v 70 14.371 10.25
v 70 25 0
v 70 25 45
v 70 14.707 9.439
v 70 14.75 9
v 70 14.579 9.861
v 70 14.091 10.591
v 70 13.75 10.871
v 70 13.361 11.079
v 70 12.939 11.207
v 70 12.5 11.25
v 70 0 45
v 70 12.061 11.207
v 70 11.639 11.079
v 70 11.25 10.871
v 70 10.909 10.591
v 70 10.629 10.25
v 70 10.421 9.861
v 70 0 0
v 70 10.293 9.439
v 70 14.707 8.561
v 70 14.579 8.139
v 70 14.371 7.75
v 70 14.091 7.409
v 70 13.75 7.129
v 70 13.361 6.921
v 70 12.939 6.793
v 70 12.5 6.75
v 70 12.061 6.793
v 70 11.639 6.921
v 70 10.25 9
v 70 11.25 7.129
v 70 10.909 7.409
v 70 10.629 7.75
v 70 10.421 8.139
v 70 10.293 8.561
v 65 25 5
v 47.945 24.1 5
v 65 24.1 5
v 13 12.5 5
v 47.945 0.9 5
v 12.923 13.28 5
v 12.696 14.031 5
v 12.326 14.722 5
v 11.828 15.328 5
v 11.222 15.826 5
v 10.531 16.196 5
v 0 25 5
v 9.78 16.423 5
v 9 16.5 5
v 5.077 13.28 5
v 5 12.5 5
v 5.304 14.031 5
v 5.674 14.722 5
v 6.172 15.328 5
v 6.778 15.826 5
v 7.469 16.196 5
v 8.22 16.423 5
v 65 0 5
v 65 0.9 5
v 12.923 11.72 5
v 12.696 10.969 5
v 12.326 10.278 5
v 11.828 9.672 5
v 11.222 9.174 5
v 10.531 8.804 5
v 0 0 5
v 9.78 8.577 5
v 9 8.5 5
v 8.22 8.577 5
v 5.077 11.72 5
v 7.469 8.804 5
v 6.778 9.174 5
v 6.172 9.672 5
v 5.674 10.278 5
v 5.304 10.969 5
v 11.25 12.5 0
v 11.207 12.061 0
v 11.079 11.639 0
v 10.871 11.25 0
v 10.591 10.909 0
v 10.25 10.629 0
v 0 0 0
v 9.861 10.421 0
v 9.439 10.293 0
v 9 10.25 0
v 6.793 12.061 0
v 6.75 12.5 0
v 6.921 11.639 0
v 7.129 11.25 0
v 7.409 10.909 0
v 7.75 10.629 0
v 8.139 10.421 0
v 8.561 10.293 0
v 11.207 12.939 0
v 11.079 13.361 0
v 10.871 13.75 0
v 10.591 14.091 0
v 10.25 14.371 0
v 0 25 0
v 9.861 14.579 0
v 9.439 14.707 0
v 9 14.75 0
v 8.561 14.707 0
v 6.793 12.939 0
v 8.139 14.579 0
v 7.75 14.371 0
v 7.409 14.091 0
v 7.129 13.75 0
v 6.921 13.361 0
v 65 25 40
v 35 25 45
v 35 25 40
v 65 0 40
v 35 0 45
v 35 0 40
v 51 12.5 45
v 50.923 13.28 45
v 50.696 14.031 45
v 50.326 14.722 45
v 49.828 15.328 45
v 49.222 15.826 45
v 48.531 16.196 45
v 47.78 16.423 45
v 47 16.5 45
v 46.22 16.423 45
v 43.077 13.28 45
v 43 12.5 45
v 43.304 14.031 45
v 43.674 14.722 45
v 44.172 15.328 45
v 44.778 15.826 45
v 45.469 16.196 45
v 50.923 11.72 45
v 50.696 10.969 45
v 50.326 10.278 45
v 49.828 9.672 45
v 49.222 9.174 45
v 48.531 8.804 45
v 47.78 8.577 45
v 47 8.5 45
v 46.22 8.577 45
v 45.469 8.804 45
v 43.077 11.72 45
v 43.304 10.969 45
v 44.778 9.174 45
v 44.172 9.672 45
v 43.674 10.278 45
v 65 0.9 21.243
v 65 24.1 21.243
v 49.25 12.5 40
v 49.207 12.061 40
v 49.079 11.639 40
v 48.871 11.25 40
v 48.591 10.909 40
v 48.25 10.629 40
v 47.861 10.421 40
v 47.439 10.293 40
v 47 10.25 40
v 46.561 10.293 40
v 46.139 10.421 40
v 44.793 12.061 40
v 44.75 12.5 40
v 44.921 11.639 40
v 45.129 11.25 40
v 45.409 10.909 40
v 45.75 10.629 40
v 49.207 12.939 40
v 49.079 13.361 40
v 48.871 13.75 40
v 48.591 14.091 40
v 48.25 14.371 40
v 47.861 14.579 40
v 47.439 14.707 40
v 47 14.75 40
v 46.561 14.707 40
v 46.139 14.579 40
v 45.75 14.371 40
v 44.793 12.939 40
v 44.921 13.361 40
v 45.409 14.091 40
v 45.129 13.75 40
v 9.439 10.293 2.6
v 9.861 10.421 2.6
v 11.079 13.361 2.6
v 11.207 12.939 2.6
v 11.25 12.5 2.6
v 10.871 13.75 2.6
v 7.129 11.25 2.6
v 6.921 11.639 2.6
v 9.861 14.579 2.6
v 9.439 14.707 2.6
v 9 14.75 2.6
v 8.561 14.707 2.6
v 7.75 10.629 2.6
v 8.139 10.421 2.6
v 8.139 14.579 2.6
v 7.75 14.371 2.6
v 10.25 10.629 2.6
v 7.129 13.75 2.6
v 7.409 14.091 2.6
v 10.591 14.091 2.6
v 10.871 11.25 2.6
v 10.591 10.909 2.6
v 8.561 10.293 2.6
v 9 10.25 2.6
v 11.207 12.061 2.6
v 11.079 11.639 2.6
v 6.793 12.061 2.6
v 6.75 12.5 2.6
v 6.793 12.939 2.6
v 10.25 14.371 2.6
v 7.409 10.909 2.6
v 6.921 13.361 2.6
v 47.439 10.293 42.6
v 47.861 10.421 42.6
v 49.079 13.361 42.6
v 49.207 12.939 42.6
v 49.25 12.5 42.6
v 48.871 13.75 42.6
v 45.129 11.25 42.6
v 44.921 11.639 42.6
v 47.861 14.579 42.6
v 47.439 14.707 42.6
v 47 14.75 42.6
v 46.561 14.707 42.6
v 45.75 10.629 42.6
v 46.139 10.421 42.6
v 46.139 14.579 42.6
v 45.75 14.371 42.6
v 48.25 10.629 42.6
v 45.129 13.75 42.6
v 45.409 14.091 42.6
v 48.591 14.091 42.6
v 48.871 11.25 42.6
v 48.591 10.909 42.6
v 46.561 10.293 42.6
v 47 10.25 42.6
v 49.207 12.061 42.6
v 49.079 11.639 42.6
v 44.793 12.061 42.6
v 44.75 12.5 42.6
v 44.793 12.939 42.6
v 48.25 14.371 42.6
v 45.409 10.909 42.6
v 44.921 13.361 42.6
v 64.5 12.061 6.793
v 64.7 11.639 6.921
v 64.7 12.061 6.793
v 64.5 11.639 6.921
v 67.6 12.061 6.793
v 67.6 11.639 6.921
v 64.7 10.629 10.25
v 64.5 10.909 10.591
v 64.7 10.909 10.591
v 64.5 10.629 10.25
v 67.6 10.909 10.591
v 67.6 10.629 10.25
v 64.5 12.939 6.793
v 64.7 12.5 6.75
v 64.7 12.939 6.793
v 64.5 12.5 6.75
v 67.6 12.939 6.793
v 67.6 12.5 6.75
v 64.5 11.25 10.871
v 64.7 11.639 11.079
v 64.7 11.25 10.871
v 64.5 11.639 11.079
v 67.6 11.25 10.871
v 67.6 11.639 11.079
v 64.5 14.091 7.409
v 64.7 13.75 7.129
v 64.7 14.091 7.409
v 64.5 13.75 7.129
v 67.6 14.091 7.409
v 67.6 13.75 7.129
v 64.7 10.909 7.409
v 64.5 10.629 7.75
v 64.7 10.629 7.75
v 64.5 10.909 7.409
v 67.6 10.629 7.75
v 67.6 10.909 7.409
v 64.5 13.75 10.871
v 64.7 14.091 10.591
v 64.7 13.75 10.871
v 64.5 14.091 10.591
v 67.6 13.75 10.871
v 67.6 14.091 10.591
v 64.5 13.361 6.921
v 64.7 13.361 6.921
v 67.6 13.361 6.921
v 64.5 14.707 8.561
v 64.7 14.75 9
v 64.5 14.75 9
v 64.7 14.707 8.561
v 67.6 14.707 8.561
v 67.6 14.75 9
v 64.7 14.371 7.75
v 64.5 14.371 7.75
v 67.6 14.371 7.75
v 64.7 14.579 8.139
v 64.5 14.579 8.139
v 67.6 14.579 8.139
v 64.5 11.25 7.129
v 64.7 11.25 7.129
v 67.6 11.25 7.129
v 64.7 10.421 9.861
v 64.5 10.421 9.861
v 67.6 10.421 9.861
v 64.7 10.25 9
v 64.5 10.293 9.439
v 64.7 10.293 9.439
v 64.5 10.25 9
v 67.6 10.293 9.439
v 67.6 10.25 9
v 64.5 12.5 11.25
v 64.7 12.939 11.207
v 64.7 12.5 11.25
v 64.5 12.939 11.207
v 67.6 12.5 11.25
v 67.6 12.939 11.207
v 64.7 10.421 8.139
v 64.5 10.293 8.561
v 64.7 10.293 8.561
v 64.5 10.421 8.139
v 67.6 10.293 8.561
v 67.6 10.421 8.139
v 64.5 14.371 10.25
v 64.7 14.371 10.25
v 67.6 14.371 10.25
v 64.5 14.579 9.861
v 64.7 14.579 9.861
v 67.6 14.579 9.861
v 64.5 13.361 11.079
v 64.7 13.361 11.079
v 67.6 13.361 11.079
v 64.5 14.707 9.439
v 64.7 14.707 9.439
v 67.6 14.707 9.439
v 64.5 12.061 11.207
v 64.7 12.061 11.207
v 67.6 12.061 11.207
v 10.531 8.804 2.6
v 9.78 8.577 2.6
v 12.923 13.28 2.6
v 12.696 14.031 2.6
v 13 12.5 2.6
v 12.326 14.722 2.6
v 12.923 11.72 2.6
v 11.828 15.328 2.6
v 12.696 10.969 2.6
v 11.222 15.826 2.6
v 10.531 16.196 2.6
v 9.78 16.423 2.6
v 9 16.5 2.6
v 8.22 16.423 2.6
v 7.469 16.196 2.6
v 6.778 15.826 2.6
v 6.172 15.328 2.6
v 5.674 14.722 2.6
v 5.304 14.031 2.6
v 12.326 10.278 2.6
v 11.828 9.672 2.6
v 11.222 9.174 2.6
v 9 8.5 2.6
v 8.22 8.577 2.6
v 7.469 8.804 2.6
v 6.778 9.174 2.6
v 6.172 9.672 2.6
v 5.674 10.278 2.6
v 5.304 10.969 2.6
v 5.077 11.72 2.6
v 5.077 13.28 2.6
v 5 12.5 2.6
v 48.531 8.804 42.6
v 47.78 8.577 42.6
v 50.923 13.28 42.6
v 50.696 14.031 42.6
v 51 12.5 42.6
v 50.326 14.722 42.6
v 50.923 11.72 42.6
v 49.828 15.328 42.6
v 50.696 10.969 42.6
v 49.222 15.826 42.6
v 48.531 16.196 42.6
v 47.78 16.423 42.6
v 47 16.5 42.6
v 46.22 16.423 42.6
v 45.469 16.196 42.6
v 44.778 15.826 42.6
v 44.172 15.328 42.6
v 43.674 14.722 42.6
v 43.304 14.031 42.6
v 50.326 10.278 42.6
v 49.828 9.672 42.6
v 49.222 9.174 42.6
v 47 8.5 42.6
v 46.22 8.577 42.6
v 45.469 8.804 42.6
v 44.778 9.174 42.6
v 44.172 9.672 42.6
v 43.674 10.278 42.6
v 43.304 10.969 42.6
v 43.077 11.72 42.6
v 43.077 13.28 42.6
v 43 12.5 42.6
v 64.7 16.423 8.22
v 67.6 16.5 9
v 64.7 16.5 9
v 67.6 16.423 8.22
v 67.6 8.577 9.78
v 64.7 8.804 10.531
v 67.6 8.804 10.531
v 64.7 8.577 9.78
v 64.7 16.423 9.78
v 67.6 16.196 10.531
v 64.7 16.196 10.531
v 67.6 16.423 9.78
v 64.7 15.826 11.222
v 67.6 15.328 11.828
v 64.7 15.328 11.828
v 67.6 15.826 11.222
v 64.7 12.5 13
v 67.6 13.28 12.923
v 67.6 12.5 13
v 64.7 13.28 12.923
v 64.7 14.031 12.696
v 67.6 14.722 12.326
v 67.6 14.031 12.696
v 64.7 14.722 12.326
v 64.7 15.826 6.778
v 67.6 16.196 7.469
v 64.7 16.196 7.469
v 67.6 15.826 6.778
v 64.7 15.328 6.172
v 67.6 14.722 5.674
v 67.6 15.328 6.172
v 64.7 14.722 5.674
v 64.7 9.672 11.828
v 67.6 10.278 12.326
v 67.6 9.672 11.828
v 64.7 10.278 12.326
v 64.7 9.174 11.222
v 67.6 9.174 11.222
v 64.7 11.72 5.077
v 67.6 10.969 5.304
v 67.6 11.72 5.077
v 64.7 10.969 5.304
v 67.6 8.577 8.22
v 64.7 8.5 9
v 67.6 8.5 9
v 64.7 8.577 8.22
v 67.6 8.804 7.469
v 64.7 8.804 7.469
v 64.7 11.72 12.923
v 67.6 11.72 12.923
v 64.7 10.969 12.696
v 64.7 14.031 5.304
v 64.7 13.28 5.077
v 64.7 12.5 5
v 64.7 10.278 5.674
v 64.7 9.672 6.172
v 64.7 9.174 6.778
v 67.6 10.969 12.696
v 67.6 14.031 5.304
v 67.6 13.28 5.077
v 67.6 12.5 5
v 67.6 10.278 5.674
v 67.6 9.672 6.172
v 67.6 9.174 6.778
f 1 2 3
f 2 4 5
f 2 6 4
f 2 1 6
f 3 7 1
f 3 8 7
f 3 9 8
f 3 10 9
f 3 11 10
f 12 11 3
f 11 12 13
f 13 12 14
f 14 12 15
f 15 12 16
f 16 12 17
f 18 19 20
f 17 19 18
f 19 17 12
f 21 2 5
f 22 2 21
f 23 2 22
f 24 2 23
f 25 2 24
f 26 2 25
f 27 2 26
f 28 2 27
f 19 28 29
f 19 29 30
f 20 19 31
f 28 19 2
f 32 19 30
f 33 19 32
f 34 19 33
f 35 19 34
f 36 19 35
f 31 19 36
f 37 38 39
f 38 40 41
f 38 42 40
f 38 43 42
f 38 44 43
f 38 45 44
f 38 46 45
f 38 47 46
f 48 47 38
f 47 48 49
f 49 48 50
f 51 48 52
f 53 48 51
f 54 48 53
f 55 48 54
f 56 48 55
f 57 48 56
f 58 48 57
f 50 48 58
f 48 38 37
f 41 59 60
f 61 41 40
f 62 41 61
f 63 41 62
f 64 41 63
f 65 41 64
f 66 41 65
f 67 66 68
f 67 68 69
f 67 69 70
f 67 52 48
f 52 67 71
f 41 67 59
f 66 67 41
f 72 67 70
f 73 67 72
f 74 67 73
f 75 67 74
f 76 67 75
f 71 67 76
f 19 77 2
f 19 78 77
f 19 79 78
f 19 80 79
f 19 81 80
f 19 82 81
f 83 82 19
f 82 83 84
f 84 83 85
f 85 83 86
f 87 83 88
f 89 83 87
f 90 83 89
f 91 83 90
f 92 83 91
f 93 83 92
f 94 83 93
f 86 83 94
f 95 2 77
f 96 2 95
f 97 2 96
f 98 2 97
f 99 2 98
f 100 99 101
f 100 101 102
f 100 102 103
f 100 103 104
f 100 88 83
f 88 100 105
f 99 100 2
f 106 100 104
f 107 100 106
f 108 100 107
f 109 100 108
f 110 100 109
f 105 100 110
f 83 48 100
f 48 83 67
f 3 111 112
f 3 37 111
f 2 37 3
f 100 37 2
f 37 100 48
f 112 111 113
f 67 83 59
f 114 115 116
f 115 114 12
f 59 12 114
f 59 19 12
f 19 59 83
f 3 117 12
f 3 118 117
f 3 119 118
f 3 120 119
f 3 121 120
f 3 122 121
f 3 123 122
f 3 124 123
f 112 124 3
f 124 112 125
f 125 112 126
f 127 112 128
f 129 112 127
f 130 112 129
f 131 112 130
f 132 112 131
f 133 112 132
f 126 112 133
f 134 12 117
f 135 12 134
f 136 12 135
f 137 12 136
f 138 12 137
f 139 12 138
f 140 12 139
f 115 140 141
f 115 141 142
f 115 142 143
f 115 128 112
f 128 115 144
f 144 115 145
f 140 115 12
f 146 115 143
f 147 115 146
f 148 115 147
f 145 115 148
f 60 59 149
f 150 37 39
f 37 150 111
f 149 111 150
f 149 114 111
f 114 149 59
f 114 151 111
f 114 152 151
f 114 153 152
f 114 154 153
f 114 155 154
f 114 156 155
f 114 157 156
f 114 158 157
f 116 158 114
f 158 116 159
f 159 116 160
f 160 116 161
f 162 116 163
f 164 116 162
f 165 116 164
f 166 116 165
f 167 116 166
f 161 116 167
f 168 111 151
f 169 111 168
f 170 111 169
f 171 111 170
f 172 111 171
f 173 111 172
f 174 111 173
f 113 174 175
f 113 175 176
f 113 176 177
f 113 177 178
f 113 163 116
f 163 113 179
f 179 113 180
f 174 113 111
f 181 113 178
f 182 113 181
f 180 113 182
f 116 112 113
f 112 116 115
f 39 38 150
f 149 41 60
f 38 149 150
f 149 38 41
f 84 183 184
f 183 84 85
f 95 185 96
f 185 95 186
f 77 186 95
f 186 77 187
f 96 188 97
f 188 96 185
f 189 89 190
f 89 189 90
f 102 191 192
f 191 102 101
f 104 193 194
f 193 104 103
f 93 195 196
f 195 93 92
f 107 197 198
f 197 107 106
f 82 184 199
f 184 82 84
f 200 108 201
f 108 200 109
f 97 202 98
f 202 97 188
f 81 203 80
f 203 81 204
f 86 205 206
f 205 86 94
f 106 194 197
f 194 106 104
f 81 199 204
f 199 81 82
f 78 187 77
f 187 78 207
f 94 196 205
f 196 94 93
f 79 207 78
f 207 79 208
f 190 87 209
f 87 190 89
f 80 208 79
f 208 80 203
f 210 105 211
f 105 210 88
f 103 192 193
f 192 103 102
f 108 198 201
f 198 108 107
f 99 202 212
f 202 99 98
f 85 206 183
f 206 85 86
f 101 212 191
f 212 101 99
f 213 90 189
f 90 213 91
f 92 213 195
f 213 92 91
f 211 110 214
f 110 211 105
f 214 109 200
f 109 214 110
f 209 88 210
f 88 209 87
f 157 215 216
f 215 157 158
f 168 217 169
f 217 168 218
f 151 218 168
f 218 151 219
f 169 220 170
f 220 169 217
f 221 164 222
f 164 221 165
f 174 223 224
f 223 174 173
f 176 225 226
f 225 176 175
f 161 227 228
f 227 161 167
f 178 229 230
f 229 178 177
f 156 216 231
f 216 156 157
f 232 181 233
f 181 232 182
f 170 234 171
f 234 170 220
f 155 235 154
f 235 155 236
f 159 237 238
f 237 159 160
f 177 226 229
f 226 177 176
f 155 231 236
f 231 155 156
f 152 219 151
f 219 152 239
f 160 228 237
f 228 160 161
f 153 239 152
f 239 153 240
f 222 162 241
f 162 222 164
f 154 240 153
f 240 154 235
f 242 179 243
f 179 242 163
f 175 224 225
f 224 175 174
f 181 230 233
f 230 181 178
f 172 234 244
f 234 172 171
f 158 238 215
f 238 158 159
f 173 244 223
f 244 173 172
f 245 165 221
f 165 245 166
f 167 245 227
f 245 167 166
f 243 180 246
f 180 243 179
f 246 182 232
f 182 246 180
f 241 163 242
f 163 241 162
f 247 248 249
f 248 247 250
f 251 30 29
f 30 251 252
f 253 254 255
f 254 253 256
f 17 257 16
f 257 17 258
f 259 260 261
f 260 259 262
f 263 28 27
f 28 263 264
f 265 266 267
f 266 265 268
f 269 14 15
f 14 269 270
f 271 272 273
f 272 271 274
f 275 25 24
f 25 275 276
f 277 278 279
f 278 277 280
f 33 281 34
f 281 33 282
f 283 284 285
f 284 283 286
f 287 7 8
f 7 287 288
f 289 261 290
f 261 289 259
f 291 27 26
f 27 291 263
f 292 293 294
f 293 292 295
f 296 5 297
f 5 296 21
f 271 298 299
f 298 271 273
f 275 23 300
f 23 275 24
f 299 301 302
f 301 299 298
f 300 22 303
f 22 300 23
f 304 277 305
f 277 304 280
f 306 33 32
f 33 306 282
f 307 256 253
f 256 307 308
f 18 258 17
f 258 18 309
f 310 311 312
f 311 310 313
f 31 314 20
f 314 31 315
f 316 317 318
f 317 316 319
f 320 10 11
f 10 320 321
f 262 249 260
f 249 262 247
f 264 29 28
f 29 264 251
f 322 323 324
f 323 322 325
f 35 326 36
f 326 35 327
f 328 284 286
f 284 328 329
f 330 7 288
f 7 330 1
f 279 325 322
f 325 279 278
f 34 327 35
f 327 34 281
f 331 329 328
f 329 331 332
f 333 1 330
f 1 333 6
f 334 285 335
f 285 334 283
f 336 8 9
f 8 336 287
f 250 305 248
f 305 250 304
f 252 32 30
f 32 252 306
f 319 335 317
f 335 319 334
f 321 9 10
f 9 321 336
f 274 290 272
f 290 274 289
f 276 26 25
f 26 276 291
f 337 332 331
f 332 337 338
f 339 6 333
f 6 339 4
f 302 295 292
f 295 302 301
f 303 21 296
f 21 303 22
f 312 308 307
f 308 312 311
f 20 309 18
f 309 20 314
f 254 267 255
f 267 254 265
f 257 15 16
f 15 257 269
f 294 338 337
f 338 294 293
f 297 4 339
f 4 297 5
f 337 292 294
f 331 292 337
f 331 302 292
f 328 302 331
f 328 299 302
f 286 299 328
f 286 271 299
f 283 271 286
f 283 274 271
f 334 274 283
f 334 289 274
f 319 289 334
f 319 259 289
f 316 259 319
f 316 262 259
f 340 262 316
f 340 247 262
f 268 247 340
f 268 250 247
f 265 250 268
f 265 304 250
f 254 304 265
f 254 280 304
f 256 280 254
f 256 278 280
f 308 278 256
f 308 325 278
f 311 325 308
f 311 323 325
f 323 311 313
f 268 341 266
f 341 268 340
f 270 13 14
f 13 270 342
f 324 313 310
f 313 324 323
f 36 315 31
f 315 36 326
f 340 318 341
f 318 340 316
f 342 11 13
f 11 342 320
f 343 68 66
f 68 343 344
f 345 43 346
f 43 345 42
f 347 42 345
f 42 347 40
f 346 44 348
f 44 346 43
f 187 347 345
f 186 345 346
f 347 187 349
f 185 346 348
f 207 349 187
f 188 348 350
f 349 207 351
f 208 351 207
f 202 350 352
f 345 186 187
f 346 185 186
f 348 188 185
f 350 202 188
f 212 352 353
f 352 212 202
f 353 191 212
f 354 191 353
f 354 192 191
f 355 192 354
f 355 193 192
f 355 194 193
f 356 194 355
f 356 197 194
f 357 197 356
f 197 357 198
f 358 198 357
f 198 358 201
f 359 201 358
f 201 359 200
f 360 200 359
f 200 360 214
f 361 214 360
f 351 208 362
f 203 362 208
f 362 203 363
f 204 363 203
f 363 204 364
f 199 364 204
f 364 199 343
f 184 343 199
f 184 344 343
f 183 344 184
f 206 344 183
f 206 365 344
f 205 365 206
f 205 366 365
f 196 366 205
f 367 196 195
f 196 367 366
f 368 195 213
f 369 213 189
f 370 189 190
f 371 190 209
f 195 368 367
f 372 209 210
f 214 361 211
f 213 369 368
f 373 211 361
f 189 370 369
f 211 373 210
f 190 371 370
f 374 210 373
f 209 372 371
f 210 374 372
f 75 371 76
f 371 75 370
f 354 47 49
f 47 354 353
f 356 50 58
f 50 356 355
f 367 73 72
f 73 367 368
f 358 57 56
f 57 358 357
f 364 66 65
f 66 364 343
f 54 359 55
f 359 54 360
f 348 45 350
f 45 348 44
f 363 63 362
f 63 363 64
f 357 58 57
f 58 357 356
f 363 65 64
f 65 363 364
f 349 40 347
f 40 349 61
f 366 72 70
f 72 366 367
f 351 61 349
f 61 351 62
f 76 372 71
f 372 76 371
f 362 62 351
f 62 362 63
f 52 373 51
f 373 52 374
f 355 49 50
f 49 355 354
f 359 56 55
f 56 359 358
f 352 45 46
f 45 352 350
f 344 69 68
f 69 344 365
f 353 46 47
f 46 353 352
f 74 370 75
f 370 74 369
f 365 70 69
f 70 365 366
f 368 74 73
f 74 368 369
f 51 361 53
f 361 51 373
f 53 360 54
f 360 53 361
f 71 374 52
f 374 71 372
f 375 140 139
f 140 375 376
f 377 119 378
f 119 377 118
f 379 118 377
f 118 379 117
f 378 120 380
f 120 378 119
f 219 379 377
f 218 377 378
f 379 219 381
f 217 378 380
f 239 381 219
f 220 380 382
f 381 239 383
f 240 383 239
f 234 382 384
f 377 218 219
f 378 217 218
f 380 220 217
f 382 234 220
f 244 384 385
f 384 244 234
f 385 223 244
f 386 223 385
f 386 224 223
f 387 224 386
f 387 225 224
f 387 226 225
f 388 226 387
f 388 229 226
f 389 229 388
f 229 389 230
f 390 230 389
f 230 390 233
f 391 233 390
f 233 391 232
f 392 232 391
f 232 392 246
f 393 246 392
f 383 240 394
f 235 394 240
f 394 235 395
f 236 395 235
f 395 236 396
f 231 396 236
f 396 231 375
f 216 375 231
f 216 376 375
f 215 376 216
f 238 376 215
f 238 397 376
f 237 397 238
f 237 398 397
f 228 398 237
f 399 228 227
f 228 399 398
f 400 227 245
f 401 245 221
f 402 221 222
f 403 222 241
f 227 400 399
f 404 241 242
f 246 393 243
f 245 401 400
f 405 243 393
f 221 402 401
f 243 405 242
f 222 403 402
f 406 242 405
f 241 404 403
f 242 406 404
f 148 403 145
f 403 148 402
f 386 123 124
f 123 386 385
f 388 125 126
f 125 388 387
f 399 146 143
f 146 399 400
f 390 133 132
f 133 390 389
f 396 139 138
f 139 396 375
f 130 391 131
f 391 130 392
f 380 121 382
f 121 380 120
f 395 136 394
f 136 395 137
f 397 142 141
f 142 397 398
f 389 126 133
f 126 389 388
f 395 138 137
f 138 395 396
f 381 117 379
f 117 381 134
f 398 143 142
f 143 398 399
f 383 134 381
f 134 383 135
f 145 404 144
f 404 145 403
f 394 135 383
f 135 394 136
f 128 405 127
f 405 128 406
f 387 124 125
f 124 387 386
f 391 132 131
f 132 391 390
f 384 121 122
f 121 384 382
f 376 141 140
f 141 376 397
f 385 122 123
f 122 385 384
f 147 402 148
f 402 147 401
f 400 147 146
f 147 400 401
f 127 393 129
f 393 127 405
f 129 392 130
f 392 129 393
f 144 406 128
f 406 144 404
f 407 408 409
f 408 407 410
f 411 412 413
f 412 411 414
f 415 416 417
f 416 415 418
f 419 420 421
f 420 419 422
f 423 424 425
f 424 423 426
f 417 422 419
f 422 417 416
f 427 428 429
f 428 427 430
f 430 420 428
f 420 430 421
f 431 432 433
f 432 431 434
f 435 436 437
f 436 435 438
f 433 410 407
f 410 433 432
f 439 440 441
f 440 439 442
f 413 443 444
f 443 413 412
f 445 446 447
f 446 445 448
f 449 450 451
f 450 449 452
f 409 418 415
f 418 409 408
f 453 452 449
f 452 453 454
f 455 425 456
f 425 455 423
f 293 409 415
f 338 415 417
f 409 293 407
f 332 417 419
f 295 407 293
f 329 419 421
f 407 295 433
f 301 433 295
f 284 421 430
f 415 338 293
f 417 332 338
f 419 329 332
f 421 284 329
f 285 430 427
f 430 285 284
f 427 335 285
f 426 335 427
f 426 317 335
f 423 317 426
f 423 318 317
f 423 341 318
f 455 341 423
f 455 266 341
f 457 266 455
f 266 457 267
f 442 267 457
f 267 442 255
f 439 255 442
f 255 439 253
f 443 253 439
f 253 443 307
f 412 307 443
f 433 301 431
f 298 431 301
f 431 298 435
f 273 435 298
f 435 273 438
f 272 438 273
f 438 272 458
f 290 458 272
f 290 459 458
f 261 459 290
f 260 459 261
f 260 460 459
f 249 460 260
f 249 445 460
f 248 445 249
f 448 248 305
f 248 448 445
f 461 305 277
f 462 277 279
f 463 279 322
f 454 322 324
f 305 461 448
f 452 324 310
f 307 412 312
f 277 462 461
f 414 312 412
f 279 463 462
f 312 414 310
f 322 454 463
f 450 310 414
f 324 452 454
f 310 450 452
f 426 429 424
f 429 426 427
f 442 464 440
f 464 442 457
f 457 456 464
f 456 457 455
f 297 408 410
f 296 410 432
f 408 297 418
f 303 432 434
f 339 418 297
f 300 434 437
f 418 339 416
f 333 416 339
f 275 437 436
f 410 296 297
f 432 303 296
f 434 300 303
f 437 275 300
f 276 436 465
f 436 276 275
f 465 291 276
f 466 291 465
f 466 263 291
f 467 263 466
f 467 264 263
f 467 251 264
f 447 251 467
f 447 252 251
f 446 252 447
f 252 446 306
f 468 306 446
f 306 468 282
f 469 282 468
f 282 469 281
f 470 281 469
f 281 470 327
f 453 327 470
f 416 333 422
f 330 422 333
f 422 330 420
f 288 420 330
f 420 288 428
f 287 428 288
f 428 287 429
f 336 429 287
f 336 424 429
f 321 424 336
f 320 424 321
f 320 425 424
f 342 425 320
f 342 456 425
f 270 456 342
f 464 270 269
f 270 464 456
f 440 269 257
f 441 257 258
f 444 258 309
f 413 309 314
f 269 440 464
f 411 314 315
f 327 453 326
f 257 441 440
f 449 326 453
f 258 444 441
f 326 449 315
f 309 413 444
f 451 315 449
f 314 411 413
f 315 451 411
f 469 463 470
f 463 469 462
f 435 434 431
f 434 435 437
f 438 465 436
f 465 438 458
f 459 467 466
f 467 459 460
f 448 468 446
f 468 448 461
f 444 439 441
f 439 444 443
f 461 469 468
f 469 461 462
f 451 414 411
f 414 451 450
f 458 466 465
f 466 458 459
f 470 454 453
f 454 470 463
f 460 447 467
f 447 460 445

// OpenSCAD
$fn = 32;

// ----------------------------------------------------------------------
// Z-bracket: 70 x 25 x 45 mm
// ----------------------------------------------------------------------

// --- parameters (mm) ---
bottom_run = 70;          // lower foot length, X
top_run = 30;             // upper foot length, X
profile_w = 25;           // bracket width, Y
height = 45;              // overall rise, Z
mat_t = 5;                // plate thickness
hole_d = 4.5;             // clearance for M4
cb_d = 8;                 // counterbore diameter
cb_h = 2.4;               // counterbore depth
rib_len = 18;             // gusset leg
rib_sink = 0.9;           // gusset overlap into the plates

module hole_z(px, py, z0) {
  translate([px, py, z0 - 0.5]) cylinder(h = mat_t + 1, d = hole_d);
}
module hole_x(py, pz) {
  translate([-0.5, py, pz]) rotate([0, 90, 0]) cylinder(h = mat_t + 1, d = hole_d);
}
module cb_z(px, py, top_z) {
  translate([px, py, top_z - cb_h]) cylinder(h = cb_h + 0.5, d = cb_d);
}
module cb_x(py, pz) {
  translate([mat_t - cb_h, py, pz]) rotate([0, -90, 0]) cylinder(h = cb_h + 0.5, d = cb_d);
}
module gusset(x0) {
  translate([x0, profile_w - rib_sink, 0])
    rotate([90, 0, 0])
      linear_extrude(height = profile_w - 2 * rib_sink)
        polygon(points = [[rib_sink, mat_t - rib_sink],
                          [rib_sink, mat_t - rib_sink + rib_len],
                          [-rib_len, mat_t - rib_sink]]);
}

difference() {
  union() {
    cube([bottom_run, profile_w, mat_t]);
    /* web, overlapping the lower foot */
    translate([bottom_run - mat_t, 0, 0]) cube([mat_t, profile_w, height]);
    /* upper foot, sunk into the web */
    translate([bottom_run - mat_t - top_run, 0, height - mat_t]) cube([top_run + mat_t, profile_w, mat_t]);
    gusset(bottom_run - mat_t);
  }
  hole_z(9, 12.5, 0);
  translate([bottom_run - mat_t - 18, 0, 0]) hole_z(0, 12.5, height - mat_t);
  translate([bottom_run - mat_t, 0, 0]) hole_x(12.5, 9);
  cb_z(9, 12.5, mat_t);
  translate([bottom_run - mat_t - 18, 0, 0]) cb_z(0, 12.5, height);
  translate([bottom_run - mat_t, 0, 0]) cb_x(12.5, 9);
}
